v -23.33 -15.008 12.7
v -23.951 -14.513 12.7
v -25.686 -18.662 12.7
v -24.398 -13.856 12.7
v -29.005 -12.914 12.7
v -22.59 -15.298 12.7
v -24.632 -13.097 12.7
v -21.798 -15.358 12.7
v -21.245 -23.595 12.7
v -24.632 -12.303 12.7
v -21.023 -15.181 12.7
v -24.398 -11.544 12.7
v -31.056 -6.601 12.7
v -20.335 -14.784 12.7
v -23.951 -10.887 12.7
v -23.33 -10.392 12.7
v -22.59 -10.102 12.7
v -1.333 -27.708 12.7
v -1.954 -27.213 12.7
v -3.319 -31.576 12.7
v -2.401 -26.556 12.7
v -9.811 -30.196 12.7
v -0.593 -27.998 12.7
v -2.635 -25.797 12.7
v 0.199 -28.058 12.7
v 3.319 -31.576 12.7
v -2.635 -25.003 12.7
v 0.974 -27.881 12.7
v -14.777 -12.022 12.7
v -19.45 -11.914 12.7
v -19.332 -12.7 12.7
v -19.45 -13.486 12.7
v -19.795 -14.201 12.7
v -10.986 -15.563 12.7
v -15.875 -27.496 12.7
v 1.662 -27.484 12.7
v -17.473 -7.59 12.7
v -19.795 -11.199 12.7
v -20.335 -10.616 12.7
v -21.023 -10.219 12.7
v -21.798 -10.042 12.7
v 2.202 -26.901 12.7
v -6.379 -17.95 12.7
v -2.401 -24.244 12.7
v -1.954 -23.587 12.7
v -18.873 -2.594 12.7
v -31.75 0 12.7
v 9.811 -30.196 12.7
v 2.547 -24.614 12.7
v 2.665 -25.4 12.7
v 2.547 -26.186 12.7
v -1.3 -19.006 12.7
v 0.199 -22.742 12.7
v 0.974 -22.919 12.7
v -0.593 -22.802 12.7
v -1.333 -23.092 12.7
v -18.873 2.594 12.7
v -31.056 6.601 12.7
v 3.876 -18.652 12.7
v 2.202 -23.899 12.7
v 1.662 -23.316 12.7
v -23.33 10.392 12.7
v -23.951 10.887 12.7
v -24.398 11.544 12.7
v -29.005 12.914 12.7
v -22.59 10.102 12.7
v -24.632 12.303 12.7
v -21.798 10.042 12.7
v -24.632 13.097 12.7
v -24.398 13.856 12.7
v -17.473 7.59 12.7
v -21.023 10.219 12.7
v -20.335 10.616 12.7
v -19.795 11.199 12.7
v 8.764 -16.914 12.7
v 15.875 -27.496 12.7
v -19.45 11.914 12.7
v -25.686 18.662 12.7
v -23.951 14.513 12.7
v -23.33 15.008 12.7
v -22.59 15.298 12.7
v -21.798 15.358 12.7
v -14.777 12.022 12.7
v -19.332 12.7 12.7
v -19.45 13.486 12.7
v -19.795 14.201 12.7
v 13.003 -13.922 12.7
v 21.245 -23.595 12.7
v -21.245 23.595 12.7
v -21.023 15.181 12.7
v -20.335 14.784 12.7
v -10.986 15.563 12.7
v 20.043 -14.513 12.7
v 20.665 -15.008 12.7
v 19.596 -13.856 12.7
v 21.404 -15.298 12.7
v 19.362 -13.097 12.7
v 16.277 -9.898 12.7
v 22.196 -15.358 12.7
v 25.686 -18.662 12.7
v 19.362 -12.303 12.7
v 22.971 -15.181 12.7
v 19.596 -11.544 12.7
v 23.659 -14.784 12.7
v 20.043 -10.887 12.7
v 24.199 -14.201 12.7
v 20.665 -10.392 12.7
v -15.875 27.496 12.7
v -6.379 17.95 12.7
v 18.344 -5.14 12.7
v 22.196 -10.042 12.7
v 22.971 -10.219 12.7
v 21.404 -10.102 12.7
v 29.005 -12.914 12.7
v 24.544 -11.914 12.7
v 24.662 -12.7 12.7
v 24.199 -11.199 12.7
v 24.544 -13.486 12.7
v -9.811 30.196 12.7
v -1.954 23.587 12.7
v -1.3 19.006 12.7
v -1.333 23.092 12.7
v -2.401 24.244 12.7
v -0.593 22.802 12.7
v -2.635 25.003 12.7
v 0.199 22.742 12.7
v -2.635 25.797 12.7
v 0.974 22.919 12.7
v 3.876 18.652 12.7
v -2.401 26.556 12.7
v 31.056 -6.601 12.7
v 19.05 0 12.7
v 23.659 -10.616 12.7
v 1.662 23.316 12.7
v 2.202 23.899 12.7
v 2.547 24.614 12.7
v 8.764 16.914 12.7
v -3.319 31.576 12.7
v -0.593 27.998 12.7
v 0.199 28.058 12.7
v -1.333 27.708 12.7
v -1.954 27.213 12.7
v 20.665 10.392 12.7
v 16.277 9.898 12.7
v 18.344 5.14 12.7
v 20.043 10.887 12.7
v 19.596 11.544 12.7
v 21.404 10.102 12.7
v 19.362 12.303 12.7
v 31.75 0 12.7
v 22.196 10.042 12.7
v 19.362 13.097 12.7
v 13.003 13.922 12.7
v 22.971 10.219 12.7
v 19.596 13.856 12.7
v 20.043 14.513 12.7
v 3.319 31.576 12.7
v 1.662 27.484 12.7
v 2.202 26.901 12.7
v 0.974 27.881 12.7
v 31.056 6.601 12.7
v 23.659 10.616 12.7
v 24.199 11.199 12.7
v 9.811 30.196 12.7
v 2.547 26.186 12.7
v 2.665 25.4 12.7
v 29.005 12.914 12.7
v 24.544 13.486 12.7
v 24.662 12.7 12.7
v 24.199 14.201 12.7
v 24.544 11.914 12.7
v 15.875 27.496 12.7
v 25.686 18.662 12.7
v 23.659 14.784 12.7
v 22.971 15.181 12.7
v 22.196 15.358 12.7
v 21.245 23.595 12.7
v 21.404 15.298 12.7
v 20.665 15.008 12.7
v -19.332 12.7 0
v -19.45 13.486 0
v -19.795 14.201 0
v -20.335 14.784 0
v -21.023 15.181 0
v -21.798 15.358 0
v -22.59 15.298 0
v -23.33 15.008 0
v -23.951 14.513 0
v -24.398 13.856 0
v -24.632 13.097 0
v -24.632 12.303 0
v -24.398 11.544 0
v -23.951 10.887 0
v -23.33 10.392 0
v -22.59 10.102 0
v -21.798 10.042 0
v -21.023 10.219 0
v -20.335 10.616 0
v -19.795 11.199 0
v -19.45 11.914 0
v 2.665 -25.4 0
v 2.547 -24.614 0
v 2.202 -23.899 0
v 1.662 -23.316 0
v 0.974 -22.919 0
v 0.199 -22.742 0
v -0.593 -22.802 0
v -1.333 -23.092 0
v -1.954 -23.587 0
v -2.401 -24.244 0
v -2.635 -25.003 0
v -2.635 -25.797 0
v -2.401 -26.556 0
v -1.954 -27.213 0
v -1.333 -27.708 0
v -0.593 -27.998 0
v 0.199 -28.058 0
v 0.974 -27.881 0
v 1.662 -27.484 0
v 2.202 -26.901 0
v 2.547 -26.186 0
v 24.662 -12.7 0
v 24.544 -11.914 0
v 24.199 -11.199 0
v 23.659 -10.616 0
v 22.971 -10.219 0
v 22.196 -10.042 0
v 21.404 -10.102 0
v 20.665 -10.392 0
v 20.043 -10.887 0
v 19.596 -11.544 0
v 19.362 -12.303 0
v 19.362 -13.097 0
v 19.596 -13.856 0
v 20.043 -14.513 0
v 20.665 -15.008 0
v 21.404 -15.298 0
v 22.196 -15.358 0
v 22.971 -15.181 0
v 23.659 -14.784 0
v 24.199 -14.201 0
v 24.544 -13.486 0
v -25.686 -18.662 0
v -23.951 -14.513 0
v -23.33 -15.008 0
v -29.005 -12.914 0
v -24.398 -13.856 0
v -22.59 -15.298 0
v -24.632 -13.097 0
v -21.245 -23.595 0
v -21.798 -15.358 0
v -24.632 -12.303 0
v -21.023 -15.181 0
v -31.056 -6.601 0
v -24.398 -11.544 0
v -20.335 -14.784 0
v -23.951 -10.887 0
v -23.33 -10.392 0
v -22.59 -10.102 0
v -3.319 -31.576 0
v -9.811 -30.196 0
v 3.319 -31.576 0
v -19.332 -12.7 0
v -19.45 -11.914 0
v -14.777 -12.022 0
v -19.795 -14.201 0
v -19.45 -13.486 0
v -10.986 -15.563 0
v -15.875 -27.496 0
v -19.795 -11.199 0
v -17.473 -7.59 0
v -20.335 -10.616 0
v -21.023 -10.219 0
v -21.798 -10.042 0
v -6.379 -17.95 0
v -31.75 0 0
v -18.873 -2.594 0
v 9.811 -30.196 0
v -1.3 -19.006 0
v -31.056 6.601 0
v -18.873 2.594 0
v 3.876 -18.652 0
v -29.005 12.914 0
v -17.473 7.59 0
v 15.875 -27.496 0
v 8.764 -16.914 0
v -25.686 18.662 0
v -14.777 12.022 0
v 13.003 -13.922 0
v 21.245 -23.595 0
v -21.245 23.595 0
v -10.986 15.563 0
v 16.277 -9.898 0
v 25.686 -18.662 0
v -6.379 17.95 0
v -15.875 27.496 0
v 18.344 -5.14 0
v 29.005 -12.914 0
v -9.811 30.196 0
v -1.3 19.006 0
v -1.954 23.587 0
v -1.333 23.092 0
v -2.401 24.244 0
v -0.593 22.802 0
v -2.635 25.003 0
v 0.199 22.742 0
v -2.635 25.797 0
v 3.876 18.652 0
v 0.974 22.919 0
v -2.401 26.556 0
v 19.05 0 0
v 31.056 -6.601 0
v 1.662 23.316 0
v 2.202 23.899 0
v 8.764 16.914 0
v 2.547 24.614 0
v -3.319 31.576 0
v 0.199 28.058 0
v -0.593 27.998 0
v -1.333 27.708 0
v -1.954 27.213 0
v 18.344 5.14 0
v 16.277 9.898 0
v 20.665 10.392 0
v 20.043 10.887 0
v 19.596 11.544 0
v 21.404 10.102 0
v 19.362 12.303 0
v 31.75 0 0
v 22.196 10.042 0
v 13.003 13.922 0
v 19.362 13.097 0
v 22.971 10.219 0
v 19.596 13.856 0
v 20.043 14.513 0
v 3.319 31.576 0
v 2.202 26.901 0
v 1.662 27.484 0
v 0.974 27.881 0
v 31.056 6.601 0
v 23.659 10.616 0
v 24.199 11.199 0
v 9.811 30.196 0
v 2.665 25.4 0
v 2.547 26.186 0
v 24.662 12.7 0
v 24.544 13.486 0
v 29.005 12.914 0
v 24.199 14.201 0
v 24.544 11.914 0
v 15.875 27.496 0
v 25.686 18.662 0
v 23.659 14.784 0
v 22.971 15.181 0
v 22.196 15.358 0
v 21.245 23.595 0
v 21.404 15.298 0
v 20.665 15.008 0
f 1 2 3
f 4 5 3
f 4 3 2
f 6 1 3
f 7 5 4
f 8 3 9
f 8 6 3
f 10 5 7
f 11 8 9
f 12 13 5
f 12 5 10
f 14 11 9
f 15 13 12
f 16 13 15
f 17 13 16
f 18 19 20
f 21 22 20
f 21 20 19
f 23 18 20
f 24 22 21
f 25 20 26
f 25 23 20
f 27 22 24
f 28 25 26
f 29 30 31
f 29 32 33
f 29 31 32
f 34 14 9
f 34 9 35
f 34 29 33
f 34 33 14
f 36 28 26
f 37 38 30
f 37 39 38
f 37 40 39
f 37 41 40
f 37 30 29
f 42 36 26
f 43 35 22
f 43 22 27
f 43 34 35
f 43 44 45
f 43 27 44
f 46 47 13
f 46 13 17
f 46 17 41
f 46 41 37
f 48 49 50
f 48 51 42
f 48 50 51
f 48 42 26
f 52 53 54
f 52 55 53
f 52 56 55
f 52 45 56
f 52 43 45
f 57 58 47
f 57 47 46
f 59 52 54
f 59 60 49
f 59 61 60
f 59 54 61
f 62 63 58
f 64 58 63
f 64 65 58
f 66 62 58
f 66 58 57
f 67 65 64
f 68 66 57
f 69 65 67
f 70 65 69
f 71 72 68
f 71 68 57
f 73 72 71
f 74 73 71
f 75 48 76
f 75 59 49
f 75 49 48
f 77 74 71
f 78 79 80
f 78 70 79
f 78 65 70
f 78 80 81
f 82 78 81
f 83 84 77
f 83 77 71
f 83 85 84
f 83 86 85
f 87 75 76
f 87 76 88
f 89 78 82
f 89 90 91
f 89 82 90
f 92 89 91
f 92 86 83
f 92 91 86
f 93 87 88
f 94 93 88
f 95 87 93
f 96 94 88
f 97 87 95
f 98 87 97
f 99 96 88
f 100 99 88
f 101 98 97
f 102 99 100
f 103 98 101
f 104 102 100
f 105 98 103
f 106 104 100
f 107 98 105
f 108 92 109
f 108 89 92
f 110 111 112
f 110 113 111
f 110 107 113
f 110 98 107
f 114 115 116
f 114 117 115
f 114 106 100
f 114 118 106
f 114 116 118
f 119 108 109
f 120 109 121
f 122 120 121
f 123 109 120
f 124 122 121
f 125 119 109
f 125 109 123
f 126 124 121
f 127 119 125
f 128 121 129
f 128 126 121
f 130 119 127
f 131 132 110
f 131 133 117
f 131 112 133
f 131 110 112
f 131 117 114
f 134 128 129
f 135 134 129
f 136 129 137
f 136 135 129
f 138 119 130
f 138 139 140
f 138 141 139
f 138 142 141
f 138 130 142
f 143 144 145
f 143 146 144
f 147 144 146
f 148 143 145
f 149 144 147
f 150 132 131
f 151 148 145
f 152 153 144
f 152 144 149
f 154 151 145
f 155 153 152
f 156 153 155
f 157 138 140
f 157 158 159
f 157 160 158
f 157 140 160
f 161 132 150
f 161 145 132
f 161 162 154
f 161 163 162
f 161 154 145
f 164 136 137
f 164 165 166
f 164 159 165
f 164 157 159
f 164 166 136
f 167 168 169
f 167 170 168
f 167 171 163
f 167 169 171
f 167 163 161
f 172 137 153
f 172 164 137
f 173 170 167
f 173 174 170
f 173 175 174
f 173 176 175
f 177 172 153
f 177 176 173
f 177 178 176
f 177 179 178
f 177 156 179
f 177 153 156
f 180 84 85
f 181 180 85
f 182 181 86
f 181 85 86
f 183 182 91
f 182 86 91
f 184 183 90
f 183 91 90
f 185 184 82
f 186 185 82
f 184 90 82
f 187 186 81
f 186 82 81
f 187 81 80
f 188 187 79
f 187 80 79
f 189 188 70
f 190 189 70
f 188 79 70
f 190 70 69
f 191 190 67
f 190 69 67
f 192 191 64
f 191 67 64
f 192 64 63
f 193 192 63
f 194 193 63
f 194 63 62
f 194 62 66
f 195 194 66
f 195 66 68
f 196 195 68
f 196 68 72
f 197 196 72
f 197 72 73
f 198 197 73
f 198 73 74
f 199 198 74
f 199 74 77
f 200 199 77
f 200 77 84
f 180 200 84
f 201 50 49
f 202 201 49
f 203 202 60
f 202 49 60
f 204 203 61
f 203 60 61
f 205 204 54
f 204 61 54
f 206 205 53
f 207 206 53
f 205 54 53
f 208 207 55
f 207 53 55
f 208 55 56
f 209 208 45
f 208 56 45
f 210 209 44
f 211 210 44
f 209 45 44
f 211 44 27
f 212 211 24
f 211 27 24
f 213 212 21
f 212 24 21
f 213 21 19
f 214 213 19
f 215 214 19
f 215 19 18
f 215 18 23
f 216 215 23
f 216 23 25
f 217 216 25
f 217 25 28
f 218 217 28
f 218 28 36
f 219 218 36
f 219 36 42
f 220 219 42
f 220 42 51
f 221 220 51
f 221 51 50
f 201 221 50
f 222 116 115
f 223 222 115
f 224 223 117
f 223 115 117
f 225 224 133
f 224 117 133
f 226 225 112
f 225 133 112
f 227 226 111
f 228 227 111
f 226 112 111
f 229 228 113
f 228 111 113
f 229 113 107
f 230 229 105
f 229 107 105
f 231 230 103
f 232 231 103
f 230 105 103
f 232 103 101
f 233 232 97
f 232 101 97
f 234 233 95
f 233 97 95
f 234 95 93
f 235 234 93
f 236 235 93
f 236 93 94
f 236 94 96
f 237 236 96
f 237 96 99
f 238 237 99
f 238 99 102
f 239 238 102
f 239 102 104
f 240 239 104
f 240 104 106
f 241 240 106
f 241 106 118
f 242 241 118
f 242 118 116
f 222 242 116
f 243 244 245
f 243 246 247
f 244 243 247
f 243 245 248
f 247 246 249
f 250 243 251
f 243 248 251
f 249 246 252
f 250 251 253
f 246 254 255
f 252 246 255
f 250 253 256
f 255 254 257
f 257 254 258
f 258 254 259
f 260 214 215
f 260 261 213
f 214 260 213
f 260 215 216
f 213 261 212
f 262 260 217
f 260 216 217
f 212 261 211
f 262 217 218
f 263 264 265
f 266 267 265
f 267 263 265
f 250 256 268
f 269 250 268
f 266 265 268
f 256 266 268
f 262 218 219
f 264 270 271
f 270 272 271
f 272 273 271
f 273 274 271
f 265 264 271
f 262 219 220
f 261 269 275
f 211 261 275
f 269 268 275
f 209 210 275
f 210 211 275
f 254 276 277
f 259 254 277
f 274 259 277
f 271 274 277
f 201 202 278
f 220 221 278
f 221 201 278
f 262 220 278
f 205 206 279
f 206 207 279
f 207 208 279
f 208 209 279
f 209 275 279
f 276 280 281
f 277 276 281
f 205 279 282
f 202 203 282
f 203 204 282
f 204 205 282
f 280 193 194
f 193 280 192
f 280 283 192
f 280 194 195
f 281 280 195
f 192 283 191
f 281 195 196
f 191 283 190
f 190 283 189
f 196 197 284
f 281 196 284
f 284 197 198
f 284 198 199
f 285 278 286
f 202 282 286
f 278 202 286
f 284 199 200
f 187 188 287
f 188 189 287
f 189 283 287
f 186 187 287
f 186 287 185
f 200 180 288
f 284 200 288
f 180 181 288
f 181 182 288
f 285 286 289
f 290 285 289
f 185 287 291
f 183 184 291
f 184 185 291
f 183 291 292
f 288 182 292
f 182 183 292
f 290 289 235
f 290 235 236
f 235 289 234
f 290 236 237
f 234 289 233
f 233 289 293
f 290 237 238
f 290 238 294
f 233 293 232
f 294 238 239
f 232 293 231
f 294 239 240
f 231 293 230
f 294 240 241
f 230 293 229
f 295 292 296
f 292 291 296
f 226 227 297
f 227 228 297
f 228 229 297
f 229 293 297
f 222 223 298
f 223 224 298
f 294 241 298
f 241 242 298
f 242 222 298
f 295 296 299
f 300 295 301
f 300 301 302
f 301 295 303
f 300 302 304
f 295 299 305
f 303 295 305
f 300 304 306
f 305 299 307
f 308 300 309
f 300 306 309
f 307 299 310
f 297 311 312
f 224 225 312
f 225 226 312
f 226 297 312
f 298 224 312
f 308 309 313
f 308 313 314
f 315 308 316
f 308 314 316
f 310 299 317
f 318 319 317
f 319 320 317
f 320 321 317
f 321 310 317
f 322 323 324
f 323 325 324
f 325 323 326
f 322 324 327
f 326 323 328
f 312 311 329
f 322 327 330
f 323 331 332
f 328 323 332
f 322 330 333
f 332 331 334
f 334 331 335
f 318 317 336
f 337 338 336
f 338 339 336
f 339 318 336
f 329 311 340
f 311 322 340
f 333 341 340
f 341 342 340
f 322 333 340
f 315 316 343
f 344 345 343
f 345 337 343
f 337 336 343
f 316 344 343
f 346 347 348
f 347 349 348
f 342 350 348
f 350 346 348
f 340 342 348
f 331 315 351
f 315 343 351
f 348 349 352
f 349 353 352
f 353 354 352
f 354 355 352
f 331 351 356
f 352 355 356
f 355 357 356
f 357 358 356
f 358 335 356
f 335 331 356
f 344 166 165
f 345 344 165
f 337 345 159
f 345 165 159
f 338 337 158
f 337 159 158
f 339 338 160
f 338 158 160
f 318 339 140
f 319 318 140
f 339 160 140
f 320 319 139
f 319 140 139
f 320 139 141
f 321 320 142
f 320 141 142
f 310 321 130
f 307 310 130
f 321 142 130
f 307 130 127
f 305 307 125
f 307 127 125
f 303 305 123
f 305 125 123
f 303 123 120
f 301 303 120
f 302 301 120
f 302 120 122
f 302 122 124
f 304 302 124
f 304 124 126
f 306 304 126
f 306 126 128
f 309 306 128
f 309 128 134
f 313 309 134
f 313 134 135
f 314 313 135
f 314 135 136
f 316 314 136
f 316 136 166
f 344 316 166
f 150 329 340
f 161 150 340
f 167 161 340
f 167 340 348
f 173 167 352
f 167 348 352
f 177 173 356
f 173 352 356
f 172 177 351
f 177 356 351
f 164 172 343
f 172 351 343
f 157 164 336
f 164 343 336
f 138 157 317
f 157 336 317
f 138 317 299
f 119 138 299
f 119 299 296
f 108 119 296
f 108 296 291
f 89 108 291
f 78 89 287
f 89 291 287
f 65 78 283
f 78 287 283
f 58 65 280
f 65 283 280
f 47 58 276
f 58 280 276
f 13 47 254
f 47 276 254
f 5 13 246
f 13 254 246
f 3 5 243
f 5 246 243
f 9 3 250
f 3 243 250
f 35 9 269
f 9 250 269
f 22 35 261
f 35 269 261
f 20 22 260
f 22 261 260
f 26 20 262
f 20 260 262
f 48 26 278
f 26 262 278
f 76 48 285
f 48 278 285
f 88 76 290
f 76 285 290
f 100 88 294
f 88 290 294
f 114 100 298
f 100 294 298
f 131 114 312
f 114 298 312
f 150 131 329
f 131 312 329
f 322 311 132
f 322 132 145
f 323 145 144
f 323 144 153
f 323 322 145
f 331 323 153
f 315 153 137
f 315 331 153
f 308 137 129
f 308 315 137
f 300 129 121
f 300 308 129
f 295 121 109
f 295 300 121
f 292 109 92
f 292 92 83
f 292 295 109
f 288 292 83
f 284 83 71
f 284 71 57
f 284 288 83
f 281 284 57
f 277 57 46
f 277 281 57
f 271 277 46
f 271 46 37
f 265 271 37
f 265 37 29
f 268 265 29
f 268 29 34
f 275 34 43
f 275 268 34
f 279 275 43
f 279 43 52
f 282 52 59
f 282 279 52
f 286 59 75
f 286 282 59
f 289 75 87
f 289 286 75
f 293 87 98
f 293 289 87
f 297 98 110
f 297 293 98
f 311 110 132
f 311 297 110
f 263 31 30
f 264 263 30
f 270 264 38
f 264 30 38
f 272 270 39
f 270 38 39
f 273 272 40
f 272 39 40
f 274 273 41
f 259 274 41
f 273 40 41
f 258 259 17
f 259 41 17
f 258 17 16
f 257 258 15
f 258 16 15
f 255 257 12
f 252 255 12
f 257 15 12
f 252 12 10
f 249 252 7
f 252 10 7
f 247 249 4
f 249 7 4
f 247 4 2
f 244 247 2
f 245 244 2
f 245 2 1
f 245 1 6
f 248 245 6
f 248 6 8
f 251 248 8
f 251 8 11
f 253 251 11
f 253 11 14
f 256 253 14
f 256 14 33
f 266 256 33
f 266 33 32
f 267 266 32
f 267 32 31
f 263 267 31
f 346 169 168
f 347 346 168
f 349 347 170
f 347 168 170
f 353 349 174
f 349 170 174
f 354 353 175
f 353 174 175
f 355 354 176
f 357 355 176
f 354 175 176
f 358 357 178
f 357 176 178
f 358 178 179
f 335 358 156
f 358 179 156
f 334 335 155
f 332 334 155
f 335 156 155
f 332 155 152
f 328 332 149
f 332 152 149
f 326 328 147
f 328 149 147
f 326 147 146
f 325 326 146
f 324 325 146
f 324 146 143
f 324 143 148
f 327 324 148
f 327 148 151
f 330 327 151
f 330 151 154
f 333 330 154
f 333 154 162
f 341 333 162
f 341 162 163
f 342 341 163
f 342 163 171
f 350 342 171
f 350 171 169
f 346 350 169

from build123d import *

# Parameters (mm, degrees)
SKETCH1_R           = 31.75
SKETCH1_R_2         = 19.05
BOSS_EXTRUDE1_DEPTH = 12.7
CUT_EXTRUDE1_REACH  = 48.663
SKETCH2_R           = 2.665


with BuildPart() as part:
    # Sketch1 → Boss-Extrude1 (new body)
    with BuildSketch(Plane.XY):
        Circle(SKETCH1_R)
        Circle(SKETCH1_R_2, mode=Mode.SUBTRACT)
    extrude(amount=BOSS_EXTRUDE1_DEPTH)

    # Sketch2 → Cut-Extrude1 (cut, up to next)
    with BuildSketch(Plane.XY.offset(12.7), mode=Mode.PRIVATE) as cut_extrude1_sk1:
        with Locations((0, 25.4)):
            Circle(SKETCH2_R)
    cut_extrude1_tool1 = extrude(cut_extrude1_sk1.sketch, amount=-CUT_EXTRUDE1_REACH, mode=Mode.PRIVATE) & part.part
    # Sketch2 → Cut-Extrude1 (cut, up to next)
    with BuildSketch(Plane.XY.offset(12.7), mode=Mode.PRIVATE) as cut_extrude1_sk2:
        with Locations((21.997045256, 12.7)):
            Circle(SKETCH2_R)
    cut_extrude1_tool2 = extrude(cut_extrude1_sk2.sketch, amount=-CUT_EXTRUDE1_REACH, mode=Mode.PRIVATE) & part.part
    # Sketch2 → Cut-Extrude1 (cut, up to next)
    with BuildSketch(Plane.XY.offset(12.7), mode=Mode.PRIVATE) as cut_extrude1_sk3:
        with Locations((21.997045256, -12.7)):
            Circle(SKETCH2_R)
    cut_extrude1_tool3 = extrude(cut_extrude1_sk3.sketch, amount=-CUT_EXTRUDE1_REACH, mode=Mode.PRIVATE) & part.part
    # Sketch2 → Cut-Extrude1 (cut, up to next)
    with BuildSketch(Plane.XY.offset(12.7), mode=Mode.PRIVATE) as cut_extrude1_sk4:
        with Locations((0, -25.4)):
            Circle(SKETCH2_R)
    cut_extrude1_tool4 = extrude(cut_extrude1_sk4.sketch, amount=-CUT_EXTRUDE1_REACH, mode=Mode.PRIVATE) & part.part
    # Sketch2 → Cut-Extrude1 (cut, up to next)
    with BuildSketch(Plane.XY.offset(12.7), mode=Mode.PRIVATE) as cut_extrude1_sk5:
        with Locations((-21.997045256, -12.7)):
            Circle(SKETCH2_R)
    cut_extrude1_tool5 = extrude(cut_extrude1_sk5.sketch, amount=-CUT_EXTRUDE1_REACH, mode=Mode.PRIVATE) & part.part
    # Sketch2 → Cut-Extrude1 (cut, up to next)
    with BuildSketch(Plane.XY.offset(12.7), mode=Mode.PRIVATE) as cut_extrude1_sk6:
        with Locations((-21.997045256, 12.7)):
            Circle(SKETCH2_R)
    cut_extrude1_tool6 = extrude(cut_extrude1_sk6.sketch, amount=-CUT_EXTRUDE1_REACH, mode=Mode.PRIVATE) & part.part
    add(cut_extrude1_tool1.solids().sort_by_distance((0, 25.4, 12.7))[0], mode=Mode.SUBTRACT)
    add(cut_extrude1_tool2.solids().sort_by_distance((21.997045, 12.7, 12.7))[0], mode=Mode.SUBTRACT)
    add(cut_extrude1_tool3.solids().sort_by_distance((21.997045, -12.7, 12.7))[0], mode=Mode.SUBTRACT)
    add(cut_extrude1_tool4.solids().sort_by_distance((0, -25.4, 12.7))[0], mode=Mode.SUBTRACT)
    add(cut_extrude1_tool5.solids().sort_by_distance((-21.997045, -12.7, 12.7))[0], mode=Mode.SUBTRACT)
    add(cut_extrude1_tool6.solids().sort_by_distance((-21.997045, 12.7, 12.7))[0], mode=Mode.SUBTRACT)


solid = part.part
